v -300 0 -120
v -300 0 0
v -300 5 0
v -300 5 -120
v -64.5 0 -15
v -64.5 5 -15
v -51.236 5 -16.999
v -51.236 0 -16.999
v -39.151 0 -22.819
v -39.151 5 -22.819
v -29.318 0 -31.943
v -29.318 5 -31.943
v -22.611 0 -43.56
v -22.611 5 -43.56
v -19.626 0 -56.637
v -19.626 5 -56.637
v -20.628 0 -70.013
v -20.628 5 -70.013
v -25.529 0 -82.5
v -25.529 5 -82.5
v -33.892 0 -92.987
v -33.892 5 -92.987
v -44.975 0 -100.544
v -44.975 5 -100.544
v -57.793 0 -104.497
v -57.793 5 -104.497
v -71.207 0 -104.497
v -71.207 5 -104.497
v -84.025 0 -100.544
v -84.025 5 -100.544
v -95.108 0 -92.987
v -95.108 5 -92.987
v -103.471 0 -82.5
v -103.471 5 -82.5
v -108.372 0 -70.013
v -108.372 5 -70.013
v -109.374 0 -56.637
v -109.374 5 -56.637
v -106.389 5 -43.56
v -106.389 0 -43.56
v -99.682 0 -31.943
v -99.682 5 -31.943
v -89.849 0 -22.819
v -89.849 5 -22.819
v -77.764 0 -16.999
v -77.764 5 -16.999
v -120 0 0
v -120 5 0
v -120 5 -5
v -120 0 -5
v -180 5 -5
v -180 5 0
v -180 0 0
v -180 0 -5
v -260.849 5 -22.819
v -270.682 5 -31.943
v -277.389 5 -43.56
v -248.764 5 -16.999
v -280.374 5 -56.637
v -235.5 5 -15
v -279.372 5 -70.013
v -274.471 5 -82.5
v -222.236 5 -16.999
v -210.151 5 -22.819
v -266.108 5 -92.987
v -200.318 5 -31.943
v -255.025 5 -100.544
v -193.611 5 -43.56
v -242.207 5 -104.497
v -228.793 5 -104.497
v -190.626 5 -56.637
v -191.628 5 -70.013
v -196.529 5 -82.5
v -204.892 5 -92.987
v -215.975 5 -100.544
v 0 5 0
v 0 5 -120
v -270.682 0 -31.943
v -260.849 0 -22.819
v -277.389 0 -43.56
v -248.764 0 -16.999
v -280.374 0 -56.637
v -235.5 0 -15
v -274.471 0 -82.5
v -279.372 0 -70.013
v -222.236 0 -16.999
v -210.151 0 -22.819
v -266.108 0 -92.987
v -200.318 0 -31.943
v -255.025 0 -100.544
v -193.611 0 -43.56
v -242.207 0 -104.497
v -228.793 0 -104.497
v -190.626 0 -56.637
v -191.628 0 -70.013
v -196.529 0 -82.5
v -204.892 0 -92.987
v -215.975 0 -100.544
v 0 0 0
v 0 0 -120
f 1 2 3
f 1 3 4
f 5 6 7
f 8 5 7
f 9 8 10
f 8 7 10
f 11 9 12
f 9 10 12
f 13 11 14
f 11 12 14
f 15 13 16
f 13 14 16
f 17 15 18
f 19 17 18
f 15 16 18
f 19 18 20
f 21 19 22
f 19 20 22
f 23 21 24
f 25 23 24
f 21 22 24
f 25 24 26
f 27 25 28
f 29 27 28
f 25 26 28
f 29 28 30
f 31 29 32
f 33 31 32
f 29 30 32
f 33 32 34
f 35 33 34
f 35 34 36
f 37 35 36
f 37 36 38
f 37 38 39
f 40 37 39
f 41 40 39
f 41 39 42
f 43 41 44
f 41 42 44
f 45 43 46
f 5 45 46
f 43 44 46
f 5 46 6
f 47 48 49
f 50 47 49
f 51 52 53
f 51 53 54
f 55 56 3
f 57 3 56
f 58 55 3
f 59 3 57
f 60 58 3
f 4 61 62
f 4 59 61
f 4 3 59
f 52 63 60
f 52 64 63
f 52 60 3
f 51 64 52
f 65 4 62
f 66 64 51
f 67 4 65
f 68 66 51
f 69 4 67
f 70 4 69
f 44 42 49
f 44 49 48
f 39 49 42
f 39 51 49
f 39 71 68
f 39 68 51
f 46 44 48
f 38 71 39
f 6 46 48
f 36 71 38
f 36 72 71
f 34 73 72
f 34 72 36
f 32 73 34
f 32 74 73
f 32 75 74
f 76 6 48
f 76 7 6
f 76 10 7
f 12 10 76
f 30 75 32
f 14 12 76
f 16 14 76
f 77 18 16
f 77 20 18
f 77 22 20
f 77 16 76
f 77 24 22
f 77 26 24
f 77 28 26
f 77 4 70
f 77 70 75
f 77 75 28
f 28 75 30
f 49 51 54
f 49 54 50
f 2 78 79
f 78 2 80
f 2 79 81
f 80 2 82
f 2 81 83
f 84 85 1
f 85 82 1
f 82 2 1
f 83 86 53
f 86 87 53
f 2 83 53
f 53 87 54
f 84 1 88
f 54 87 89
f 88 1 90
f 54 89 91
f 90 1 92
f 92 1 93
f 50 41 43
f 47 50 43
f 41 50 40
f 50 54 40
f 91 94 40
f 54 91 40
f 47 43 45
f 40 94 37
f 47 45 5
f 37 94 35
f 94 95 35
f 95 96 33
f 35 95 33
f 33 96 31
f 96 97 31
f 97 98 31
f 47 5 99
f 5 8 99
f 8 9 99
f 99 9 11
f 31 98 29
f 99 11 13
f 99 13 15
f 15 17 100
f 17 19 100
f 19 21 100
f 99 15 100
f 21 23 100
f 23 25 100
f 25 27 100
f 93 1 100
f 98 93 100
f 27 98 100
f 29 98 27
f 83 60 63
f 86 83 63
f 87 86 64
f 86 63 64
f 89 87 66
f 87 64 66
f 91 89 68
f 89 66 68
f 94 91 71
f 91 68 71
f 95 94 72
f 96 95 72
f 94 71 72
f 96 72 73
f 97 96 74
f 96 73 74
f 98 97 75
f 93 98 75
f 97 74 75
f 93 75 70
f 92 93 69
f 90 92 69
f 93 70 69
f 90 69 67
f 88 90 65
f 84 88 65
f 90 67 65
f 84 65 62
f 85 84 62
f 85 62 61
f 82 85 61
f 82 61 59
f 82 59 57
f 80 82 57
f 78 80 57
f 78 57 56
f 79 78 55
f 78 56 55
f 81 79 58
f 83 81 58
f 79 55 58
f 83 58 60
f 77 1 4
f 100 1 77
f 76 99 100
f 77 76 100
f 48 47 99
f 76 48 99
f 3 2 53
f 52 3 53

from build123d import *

# Parameters (mm, degrees)
SKETCH1_W           = 300
SKETCH1_H           = 120
BOSS_EXTRUDE1_DEPTH = 5
SKETCH2_R           = 45
SKETCH2_W           = 60
SKETCH2_H           = 5
CUT_EXTRUDE1_DEPTH  = 5


with BuildPart() as part:
    # Sketch1 → Boss-Extrude1 (new body)
    with BuildSketch(Plane(origin=(0, 0, 0), x_dir=(1, 0, 0), z_dir=(0, 1, 0))):
        with Locations((-150, 60)):
            Rectangle(SKETCH1_W, SKETCH1_H)
    extrude(amount=BOSS_EXTRUDE1_DEPTH)

    # Sketch2 → Cut-Extrude1 (cut)
    with BuildSketch(Plane(origin=(0, 5, 0), x_dir=(1, 0, 0), z_dir=(0, 1, 0))):
        with Locations(Location((-64.5, 60, 0), (0, 0, 270))):
            Circle(SKETCH2_R)
        with Locations(Location((-235.5, 60, 0), (0, 0, 270))):
            Circle(SKETCH2_R)
        with Locations((-150, 2.5)):
            Rectangle(SKETCH2_W, SKETCH2_H)
    extrude(amount=-CUT_EXTRUDE1_DEPTH, mode=Mode.SUBTRACT)


solid = part.part
